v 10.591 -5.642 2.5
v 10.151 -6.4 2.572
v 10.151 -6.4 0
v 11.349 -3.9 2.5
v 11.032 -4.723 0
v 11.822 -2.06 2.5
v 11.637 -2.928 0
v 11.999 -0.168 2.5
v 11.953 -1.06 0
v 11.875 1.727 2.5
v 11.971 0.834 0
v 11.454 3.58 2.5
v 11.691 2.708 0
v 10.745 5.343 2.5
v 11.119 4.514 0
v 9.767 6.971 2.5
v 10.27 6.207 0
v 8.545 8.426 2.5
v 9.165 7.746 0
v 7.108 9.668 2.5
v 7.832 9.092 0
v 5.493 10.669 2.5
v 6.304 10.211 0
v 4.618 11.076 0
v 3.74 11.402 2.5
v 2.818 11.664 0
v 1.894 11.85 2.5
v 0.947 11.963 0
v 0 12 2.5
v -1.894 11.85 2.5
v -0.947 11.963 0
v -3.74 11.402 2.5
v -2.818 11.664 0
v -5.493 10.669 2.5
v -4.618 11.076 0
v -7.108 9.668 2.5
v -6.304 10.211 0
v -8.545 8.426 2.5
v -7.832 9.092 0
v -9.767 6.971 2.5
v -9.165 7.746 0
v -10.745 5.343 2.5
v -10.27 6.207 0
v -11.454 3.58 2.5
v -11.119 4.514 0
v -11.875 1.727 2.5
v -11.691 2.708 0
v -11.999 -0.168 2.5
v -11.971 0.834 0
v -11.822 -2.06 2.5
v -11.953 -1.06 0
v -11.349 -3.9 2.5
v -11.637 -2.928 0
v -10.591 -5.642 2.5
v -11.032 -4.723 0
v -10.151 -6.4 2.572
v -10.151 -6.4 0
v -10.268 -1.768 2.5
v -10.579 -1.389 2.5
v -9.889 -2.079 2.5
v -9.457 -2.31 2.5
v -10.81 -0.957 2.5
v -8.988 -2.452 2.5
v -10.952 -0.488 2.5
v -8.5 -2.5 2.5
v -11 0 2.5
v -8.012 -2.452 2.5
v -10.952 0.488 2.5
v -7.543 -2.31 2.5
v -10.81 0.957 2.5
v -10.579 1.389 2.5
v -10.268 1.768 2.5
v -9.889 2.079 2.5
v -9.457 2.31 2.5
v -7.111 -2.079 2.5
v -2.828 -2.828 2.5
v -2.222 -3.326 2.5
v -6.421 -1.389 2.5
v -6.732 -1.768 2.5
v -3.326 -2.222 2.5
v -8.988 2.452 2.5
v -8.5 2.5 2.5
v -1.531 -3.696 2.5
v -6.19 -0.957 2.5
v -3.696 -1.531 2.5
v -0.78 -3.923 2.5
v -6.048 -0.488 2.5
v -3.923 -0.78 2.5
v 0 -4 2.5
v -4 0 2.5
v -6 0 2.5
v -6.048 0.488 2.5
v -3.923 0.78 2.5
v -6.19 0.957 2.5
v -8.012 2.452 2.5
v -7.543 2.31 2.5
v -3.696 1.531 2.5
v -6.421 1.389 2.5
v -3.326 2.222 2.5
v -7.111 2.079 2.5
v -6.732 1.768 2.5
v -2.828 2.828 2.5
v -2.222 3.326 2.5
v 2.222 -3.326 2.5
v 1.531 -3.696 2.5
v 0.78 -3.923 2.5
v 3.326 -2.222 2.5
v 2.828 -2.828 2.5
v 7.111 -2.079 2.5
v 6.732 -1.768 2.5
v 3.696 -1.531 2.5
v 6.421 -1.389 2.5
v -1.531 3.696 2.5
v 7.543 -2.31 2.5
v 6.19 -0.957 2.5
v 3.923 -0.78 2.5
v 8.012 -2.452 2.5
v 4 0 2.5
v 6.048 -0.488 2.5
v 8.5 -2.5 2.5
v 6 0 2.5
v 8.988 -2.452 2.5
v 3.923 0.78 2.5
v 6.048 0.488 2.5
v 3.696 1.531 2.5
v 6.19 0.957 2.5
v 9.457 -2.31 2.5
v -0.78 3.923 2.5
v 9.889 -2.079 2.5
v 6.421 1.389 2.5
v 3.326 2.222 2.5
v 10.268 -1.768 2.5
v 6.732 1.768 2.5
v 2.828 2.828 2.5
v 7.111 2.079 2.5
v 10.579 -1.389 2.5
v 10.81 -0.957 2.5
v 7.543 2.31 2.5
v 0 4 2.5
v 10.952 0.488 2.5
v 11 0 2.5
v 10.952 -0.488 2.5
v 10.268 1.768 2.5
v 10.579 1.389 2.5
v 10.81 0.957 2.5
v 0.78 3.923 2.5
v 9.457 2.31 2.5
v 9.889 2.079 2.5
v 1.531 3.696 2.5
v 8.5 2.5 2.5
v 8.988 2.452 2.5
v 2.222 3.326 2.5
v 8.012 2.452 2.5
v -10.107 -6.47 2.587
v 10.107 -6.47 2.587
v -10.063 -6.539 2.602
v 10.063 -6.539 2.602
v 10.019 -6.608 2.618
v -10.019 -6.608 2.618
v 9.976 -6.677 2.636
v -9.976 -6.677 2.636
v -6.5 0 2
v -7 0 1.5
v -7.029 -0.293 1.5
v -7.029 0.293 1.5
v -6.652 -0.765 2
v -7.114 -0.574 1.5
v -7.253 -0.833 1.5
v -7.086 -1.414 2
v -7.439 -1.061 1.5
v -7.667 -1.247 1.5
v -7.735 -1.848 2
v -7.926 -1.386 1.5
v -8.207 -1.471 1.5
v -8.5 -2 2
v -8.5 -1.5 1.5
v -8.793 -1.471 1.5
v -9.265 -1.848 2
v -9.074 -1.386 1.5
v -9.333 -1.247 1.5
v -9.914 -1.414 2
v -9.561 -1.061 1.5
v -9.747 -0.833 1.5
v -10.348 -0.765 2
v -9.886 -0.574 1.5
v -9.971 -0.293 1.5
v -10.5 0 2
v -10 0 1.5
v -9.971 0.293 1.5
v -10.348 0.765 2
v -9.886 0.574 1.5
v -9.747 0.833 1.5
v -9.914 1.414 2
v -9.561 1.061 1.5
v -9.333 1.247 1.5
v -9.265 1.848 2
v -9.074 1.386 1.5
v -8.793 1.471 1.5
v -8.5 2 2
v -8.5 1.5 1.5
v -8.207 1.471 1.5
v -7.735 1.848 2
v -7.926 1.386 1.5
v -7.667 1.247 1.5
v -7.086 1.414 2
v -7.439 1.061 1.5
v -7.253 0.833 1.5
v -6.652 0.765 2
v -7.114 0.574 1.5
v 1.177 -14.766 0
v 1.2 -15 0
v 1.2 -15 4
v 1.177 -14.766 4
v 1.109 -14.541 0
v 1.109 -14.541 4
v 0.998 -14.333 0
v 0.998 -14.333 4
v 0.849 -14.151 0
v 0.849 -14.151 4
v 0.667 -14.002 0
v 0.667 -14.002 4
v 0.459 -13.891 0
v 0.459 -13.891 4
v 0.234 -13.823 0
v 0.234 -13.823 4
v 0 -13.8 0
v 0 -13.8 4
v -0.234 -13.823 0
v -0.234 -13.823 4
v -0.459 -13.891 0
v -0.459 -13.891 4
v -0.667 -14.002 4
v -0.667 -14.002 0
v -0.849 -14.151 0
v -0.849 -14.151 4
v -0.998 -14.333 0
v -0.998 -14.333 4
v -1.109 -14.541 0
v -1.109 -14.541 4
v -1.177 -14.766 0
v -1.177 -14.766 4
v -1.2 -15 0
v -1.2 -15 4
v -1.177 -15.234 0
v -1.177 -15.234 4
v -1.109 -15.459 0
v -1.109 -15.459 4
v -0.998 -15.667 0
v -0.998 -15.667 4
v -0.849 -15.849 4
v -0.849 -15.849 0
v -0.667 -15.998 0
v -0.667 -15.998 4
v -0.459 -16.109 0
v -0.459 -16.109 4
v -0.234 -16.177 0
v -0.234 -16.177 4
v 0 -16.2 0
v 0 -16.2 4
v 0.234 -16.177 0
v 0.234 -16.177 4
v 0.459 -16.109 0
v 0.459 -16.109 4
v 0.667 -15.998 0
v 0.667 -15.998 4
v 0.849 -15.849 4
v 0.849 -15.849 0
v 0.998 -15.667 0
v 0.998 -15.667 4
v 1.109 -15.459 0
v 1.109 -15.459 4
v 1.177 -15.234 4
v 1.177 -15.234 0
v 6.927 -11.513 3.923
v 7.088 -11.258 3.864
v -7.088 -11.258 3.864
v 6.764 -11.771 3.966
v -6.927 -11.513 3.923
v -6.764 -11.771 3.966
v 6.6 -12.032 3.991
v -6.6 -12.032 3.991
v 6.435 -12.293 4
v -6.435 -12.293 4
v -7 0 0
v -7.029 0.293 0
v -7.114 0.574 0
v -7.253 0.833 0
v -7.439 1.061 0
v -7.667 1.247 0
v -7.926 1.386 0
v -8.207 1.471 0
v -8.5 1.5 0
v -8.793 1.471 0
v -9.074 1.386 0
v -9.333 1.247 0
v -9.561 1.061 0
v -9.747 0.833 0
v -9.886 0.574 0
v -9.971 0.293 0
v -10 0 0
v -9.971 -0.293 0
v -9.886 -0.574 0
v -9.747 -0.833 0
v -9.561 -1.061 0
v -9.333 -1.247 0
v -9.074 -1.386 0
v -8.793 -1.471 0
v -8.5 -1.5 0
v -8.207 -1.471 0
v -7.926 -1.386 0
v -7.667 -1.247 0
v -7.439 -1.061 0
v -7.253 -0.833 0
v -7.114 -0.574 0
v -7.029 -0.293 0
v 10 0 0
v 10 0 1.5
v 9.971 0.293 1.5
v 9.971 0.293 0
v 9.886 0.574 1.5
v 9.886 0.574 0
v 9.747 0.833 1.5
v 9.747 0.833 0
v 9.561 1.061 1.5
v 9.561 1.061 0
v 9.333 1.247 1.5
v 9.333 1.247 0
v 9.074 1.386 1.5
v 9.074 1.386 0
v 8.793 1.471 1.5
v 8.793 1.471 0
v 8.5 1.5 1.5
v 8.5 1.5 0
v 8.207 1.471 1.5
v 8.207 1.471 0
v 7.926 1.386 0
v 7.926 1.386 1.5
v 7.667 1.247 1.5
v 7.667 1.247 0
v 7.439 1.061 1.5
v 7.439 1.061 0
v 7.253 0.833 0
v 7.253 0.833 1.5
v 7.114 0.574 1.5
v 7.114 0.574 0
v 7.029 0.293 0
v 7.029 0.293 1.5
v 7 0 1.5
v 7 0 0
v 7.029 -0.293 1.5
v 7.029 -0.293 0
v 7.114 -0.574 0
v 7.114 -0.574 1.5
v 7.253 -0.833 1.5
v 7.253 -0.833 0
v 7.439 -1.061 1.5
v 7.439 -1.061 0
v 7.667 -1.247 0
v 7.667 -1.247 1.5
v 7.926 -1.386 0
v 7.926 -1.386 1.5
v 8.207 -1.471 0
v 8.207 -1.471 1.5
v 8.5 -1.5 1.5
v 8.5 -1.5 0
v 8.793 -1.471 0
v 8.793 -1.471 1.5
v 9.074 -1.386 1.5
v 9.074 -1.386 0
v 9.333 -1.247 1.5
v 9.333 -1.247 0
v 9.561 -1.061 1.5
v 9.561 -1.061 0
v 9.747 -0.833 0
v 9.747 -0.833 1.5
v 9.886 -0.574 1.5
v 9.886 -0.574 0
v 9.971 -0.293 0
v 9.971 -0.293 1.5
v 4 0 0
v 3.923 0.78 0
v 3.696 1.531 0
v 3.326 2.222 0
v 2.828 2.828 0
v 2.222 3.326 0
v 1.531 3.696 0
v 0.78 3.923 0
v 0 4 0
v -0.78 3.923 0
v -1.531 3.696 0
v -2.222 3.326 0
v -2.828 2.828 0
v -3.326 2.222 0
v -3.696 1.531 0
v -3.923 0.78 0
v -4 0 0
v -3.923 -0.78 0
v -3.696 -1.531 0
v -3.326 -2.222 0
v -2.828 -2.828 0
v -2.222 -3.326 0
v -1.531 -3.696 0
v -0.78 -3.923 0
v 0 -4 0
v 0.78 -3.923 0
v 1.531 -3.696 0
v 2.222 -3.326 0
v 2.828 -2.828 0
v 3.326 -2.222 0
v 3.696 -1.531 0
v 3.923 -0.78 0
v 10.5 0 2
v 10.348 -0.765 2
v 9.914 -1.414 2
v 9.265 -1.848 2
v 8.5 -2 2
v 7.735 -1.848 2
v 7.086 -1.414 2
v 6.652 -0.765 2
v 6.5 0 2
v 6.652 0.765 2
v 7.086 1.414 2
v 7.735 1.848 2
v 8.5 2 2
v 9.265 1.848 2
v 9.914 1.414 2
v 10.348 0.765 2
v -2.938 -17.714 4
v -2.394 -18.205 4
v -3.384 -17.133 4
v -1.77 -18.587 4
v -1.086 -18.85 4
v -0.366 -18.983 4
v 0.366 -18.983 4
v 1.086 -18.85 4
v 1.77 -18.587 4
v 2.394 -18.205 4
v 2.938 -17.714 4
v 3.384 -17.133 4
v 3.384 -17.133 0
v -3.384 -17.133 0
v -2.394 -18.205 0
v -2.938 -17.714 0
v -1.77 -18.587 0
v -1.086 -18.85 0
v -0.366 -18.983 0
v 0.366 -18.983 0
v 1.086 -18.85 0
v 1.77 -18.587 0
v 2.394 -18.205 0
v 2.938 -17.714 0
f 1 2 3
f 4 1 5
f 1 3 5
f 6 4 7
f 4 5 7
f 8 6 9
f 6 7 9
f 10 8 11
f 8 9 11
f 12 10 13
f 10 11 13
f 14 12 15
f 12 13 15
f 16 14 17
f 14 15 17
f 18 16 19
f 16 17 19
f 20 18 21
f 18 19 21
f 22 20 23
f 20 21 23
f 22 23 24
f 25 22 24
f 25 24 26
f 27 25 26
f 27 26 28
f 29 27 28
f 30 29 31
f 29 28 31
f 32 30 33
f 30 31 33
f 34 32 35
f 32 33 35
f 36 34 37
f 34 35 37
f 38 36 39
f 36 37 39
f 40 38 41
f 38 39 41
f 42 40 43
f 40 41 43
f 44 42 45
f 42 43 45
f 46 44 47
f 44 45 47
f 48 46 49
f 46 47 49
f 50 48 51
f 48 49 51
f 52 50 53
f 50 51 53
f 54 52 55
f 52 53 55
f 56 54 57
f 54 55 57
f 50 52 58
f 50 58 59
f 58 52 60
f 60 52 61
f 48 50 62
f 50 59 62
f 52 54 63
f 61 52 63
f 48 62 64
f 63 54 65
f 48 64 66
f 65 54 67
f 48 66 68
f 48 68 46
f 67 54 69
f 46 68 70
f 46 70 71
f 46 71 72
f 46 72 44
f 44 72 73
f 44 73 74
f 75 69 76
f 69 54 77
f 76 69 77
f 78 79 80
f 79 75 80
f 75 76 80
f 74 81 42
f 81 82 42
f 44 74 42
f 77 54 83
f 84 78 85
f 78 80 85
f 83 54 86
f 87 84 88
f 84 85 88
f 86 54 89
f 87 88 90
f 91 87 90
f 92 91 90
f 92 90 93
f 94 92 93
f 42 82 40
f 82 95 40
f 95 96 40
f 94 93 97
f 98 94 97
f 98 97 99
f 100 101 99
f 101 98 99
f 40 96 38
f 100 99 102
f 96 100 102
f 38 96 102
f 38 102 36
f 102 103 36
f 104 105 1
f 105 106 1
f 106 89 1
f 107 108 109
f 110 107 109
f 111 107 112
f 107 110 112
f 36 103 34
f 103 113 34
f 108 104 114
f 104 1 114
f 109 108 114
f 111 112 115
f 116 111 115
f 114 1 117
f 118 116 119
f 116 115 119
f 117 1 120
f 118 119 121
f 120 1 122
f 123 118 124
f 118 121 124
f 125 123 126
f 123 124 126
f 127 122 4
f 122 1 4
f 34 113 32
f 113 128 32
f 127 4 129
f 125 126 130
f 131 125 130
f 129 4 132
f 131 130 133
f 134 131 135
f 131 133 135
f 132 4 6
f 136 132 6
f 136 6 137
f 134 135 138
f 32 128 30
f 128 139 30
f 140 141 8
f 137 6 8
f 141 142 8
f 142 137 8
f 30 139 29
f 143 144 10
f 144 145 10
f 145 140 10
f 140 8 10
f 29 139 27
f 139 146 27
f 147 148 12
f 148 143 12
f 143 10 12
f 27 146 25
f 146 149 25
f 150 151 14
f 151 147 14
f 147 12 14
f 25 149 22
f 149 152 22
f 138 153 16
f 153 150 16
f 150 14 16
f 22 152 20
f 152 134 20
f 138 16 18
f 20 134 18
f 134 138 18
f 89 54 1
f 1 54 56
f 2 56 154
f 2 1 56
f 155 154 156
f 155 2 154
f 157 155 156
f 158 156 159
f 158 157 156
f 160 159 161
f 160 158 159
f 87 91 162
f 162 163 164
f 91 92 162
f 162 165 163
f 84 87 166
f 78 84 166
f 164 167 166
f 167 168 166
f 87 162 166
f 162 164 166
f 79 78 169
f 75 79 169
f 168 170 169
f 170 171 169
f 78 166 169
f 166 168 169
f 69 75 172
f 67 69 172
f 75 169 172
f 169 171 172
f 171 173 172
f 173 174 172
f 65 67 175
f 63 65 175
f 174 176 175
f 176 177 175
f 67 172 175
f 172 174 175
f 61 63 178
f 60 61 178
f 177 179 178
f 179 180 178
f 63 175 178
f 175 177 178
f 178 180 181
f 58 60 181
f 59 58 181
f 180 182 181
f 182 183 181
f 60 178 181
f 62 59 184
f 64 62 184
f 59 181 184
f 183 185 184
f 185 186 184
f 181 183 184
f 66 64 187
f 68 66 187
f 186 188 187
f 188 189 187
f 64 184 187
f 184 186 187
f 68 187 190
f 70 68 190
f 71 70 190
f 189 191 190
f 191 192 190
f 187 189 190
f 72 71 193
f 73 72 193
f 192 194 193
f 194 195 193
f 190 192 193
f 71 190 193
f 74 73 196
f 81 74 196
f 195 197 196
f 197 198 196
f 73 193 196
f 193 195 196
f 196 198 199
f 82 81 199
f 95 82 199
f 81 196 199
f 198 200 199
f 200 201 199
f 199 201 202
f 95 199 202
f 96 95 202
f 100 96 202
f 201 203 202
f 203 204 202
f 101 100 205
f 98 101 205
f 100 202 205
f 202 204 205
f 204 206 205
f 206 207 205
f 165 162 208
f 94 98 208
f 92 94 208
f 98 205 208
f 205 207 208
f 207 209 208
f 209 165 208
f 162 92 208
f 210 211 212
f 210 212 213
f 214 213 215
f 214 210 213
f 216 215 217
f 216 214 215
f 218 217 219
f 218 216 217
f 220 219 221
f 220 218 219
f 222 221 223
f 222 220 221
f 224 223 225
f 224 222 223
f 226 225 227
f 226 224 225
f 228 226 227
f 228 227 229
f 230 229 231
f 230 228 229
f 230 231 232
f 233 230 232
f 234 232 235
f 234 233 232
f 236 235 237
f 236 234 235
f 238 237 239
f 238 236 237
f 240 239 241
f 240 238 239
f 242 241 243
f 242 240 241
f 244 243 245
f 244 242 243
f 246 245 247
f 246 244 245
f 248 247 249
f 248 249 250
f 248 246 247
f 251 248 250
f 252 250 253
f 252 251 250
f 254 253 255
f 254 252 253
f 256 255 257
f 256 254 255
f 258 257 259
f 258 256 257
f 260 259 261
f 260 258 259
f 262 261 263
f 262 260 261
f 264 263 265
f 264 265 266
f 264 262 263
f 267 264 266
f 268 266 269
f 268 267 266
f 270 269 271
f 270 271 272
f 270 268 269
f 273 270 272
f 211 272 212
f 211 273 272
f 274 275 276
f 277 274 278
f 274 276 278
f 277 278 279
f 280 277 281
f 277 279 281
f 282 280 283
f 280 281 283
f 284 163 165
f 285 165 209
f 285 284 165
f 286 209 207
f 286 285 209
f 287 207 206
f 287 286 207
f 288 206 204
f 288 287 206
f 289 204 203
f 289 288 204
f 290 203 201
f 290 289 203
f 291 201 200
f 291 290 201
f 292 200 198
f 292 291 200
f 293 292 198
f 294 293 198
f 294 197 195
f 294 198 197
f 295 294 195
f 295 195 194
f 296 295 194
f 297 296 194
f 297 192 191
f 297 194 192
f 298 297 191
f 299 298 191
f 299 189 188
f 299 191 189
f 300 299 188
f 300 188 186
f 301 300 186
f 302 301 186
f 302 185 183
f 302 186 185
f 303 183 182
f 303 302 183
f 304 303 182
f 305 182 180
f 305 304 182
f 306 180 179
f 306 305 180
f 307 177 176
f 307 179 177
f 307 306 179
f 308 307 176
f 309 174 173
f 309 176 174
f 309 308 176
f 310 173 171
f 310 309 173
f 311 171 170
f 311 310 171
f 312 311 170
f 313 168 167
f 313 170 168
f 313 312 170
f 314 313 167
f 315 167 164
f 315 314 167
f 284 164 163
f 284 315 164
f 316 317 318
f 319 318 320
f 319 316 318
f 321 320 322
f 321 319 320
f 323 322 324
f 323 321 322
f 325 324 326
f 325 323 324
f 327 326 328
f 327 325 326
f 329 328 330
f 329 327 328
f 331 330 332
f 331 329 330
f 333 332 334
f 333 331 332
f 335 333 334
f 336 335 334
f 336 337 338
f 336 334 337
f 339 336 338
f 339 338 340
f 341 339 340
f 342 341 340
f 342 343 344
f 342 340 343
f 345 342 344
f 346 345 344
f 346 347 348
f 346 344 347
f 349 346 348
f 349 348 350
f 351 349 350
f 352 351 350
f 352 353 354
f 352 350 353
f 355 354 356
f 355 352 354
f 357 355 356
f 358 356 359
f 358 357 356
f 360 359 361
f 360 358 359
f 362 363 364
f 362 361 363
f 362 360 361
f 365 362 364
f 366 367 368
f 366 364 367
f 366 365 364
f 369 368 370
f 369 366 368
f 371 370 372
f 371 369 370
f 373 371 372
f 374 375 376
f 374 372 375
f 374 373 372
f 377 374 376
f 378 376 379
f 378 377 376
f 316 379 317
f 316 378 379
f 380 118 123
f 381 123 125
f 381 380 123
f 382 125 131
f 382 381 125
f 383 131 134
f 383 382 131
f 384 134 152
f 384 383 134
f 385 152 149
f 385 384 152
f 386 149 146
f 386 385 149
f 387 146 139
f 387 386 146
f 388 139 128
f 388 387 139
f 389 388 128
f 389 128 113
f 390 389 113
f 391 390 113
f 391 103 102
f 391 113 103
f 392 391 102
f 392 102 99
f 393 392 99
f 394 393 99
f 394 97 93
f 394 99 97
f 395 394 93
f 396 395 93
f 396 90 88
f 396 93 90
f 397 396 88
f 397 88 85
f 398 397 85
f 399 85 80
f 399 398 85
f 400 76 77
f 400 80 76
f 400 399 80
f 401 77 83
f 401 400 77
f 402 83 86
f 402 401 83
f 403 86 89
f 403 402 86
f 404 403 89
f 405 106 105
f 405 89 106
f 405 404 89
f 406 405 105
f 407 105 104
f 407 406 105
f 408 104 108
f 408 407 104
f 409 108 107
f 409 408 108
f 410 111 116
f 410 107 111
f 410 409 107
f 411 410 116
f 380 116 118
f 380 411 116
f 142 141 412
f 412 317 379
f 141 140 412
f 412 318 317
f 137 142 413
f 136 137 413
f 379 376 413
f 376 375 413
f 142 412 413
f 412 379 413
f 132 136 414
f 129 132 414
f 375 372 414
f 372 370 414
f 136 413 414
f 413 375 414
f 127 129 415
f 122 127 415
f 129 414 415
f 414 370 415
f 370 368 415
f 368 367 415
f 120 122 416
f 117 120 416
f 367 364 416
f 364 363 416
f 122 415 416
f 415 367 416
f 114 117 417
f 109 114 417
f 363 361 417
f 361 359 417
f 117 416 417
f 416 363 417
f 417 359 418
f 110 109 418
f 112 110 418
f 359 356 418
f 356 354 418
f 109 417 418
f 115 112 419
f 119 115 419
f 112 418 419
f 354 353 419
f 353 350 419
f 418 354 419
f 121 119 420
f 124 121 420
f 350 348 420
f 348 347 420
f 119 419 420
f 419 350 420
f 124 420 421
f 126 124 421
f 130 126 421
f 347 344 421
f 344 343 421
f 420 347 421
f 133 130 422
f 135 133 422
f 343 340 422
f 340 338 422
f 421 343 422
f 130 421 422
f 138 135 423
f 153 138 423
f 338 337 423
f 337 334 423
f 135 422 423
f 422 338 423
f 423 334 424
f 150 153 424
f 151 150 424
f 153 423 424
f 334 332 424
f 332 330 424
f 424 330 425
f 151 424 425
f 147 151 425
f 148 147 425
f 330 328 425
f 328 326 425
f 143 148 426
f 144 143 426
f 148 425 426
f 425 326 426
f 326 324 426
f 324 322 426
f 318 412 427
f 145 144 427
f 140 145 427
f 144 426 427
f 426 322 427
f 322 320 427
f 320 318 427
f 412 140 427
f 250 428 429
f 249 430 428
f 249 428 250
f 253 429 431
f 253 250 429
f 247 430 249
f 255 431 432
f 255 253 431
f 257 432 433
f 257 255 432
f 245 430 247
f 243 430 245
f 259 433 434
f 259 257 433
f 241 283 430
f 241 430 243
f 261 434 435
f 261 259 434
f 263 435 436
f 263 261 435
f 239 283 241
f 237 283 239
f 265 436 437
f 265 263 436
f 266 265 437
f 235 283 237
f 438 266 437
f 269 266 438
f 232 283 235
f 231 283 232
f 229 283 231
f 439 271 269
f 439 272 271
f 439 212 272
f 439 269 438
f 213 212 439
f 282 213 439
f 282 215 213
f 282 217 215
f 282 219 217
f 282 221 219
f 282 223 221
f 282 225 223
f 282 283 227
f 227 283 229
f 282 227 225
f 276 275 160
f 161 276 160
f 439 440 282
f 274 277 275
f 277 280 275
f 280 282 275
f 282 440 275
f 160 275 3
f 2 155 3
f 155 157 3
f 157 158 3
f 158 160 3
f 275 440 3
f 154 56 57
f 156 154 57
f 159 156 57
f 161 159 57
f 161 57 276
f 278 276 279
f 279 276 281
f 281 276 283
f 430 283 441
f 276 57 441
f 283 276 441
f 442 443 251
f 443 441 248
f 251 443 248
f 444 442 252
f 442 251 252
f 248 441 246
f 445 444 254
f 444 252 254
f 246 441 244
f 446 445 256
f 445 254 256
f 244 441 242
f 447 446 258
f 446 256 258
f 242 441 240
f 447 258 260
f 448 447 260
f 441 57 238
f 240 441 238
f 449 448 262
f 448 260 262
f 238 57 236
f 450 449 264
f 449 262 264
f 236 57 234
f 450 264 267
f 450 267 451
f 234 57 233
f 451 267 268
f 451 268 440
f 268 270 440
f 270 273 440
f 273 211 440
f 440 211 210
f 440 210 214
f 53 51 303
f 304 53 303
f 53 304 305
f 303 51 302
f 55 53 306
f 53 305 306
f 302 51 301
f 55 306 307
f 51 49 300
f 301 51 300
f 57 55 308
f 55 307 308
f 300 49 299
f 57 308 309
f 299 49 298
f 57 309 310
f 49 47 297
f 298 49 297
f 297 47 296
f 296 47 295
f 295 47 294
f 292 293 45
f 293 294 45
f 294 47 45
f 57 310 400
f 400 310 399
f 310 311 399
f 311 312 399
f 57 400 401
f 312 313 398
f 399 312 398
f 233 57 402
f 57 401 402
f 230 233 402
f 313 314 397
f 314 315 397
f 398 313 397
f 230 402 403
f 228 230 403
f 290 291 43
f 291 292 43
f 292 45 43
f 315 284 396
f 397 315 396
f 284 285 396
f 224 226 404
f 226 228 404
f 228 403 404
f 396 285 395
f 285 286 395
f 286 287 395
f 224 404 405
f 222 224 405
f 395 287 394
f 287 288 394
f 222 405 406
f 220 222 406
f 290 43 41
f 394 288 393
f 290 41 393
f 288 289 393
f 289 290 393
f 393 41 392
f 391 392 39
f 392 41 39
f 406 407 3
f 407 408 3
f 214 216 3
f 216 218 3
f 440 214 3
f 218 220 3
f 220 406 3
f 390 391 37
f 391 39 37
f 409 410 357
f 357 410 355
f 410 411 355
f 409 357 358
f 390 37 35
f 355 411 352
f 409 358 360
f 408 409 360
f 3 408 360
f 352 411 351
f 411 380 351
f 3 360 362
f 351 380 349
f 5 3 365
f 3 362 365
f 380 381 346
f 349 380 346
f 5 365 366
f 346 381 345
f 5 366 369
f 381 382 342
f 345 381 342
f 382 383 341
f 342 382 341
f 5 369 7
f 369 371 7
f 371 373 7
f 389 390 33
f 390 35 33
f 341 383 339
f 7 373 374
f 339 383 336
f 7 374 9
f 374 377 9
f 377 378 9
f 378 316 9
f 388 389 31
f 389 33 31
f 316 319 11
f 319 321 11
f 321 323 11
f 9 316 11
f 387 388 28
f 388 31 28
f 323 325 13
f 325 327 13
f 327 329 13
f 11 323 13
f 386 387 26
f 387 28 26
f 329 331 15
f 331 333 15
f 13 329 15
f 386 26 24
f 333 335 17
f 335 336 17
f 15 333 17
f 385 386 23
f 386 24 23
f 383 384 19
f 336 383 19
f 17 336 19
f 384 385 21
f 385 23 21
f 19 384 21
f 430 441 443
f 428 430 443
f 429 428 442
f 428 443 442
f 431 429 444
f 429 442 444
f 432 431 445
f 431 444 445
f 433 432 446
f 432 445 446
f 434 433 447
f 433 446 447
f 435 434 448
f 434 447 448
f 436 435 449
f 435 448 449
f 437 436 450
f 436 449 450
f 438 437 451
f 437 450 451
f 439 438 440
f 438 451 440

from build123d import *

# Parameters (mm, degrees)
ESQUISSE1_R             = 4
ESQUISSE1_R_2           = 1.2
ESQUISSE1_R_3           = 1.5
BOSS_EXTRU_1_DEPTH      = 4
ENL_V_MAT_EXTRU_1_DEPTH = 25
CHANFREIN1_SIZE         = 1
CONG_1_R                = 4


with BuildPart() as part:
    # Esquisse1 → Boss.-Extru.1 (new body)
    with BuildSketch(Plane.XY):
        with BuildLine():
            Line((-10.150862032, -6.4), (-3.383620677, -17.133333333))
            ThreePointArc((-3.383620677, -17.133333333), (0, -19), (3.383620677, -17.133333333))
            Line((3.383620677, -17.133333333), (10.150862032, -6.4))
            ThreePointArc((10.150862032, -6.4), (0, 12), (-10.150862032, -6.4))
        make_face()
        Circle(ESQUISSE1_R, mode=Mode.SUBTRACT)
        with Locations((0, -15)):
            Circle(ESQUISSE1_R_2, mode=Mode.SUBTRACT)
        with Locations((-8.5, 0)):
            Circle(ESQUISSE1_R_3, mode=Mode.SUBTRACT)
        with Locations((8.5, 0)):
            Circle(ESQUISSE1_R_3, mode=Mode.SUBTRACT)
    extrude(amount=BOSS_EXTRU_1_DEPTH)

    # Esquisse2 → Enlèv. mat.-Extru.1 (cut, symmetric)
    with BuildSketch(Plane(origin=(0, 0, 0), x_dir=(0, 0, -1), z_dir=(1, 0, 0))):
        Polygon((-4, -11.766666667), (-2.5, -6.168590455), (-2.5, 12), (-4, 12), align=None)
    extrude(amount=ENL_V_MAT_EXTRU_1_DEPTH, both=True, mode=Mode.SUBTRACT)

    # Chanfrein1
    chanfrein1_edges = [part.edges().sort_by_distance(p)[0] for p in [
        (-10, 0, 2.5),
        (7, 0, 2.5),
    ]]
    chamfer(chanfrein1_edges, length=CHANFREIN1_SIZE)

    # Congé1
    cong_1_edges = [part.edges().sort_by_distance(p)[0] for p in [
        (0, -6.168590455, 2.5),
        (0, -11.766666667, 4),
    ]]
    fillet(cong_1_edges, radius=CONG_1_R)


solid = part.part
